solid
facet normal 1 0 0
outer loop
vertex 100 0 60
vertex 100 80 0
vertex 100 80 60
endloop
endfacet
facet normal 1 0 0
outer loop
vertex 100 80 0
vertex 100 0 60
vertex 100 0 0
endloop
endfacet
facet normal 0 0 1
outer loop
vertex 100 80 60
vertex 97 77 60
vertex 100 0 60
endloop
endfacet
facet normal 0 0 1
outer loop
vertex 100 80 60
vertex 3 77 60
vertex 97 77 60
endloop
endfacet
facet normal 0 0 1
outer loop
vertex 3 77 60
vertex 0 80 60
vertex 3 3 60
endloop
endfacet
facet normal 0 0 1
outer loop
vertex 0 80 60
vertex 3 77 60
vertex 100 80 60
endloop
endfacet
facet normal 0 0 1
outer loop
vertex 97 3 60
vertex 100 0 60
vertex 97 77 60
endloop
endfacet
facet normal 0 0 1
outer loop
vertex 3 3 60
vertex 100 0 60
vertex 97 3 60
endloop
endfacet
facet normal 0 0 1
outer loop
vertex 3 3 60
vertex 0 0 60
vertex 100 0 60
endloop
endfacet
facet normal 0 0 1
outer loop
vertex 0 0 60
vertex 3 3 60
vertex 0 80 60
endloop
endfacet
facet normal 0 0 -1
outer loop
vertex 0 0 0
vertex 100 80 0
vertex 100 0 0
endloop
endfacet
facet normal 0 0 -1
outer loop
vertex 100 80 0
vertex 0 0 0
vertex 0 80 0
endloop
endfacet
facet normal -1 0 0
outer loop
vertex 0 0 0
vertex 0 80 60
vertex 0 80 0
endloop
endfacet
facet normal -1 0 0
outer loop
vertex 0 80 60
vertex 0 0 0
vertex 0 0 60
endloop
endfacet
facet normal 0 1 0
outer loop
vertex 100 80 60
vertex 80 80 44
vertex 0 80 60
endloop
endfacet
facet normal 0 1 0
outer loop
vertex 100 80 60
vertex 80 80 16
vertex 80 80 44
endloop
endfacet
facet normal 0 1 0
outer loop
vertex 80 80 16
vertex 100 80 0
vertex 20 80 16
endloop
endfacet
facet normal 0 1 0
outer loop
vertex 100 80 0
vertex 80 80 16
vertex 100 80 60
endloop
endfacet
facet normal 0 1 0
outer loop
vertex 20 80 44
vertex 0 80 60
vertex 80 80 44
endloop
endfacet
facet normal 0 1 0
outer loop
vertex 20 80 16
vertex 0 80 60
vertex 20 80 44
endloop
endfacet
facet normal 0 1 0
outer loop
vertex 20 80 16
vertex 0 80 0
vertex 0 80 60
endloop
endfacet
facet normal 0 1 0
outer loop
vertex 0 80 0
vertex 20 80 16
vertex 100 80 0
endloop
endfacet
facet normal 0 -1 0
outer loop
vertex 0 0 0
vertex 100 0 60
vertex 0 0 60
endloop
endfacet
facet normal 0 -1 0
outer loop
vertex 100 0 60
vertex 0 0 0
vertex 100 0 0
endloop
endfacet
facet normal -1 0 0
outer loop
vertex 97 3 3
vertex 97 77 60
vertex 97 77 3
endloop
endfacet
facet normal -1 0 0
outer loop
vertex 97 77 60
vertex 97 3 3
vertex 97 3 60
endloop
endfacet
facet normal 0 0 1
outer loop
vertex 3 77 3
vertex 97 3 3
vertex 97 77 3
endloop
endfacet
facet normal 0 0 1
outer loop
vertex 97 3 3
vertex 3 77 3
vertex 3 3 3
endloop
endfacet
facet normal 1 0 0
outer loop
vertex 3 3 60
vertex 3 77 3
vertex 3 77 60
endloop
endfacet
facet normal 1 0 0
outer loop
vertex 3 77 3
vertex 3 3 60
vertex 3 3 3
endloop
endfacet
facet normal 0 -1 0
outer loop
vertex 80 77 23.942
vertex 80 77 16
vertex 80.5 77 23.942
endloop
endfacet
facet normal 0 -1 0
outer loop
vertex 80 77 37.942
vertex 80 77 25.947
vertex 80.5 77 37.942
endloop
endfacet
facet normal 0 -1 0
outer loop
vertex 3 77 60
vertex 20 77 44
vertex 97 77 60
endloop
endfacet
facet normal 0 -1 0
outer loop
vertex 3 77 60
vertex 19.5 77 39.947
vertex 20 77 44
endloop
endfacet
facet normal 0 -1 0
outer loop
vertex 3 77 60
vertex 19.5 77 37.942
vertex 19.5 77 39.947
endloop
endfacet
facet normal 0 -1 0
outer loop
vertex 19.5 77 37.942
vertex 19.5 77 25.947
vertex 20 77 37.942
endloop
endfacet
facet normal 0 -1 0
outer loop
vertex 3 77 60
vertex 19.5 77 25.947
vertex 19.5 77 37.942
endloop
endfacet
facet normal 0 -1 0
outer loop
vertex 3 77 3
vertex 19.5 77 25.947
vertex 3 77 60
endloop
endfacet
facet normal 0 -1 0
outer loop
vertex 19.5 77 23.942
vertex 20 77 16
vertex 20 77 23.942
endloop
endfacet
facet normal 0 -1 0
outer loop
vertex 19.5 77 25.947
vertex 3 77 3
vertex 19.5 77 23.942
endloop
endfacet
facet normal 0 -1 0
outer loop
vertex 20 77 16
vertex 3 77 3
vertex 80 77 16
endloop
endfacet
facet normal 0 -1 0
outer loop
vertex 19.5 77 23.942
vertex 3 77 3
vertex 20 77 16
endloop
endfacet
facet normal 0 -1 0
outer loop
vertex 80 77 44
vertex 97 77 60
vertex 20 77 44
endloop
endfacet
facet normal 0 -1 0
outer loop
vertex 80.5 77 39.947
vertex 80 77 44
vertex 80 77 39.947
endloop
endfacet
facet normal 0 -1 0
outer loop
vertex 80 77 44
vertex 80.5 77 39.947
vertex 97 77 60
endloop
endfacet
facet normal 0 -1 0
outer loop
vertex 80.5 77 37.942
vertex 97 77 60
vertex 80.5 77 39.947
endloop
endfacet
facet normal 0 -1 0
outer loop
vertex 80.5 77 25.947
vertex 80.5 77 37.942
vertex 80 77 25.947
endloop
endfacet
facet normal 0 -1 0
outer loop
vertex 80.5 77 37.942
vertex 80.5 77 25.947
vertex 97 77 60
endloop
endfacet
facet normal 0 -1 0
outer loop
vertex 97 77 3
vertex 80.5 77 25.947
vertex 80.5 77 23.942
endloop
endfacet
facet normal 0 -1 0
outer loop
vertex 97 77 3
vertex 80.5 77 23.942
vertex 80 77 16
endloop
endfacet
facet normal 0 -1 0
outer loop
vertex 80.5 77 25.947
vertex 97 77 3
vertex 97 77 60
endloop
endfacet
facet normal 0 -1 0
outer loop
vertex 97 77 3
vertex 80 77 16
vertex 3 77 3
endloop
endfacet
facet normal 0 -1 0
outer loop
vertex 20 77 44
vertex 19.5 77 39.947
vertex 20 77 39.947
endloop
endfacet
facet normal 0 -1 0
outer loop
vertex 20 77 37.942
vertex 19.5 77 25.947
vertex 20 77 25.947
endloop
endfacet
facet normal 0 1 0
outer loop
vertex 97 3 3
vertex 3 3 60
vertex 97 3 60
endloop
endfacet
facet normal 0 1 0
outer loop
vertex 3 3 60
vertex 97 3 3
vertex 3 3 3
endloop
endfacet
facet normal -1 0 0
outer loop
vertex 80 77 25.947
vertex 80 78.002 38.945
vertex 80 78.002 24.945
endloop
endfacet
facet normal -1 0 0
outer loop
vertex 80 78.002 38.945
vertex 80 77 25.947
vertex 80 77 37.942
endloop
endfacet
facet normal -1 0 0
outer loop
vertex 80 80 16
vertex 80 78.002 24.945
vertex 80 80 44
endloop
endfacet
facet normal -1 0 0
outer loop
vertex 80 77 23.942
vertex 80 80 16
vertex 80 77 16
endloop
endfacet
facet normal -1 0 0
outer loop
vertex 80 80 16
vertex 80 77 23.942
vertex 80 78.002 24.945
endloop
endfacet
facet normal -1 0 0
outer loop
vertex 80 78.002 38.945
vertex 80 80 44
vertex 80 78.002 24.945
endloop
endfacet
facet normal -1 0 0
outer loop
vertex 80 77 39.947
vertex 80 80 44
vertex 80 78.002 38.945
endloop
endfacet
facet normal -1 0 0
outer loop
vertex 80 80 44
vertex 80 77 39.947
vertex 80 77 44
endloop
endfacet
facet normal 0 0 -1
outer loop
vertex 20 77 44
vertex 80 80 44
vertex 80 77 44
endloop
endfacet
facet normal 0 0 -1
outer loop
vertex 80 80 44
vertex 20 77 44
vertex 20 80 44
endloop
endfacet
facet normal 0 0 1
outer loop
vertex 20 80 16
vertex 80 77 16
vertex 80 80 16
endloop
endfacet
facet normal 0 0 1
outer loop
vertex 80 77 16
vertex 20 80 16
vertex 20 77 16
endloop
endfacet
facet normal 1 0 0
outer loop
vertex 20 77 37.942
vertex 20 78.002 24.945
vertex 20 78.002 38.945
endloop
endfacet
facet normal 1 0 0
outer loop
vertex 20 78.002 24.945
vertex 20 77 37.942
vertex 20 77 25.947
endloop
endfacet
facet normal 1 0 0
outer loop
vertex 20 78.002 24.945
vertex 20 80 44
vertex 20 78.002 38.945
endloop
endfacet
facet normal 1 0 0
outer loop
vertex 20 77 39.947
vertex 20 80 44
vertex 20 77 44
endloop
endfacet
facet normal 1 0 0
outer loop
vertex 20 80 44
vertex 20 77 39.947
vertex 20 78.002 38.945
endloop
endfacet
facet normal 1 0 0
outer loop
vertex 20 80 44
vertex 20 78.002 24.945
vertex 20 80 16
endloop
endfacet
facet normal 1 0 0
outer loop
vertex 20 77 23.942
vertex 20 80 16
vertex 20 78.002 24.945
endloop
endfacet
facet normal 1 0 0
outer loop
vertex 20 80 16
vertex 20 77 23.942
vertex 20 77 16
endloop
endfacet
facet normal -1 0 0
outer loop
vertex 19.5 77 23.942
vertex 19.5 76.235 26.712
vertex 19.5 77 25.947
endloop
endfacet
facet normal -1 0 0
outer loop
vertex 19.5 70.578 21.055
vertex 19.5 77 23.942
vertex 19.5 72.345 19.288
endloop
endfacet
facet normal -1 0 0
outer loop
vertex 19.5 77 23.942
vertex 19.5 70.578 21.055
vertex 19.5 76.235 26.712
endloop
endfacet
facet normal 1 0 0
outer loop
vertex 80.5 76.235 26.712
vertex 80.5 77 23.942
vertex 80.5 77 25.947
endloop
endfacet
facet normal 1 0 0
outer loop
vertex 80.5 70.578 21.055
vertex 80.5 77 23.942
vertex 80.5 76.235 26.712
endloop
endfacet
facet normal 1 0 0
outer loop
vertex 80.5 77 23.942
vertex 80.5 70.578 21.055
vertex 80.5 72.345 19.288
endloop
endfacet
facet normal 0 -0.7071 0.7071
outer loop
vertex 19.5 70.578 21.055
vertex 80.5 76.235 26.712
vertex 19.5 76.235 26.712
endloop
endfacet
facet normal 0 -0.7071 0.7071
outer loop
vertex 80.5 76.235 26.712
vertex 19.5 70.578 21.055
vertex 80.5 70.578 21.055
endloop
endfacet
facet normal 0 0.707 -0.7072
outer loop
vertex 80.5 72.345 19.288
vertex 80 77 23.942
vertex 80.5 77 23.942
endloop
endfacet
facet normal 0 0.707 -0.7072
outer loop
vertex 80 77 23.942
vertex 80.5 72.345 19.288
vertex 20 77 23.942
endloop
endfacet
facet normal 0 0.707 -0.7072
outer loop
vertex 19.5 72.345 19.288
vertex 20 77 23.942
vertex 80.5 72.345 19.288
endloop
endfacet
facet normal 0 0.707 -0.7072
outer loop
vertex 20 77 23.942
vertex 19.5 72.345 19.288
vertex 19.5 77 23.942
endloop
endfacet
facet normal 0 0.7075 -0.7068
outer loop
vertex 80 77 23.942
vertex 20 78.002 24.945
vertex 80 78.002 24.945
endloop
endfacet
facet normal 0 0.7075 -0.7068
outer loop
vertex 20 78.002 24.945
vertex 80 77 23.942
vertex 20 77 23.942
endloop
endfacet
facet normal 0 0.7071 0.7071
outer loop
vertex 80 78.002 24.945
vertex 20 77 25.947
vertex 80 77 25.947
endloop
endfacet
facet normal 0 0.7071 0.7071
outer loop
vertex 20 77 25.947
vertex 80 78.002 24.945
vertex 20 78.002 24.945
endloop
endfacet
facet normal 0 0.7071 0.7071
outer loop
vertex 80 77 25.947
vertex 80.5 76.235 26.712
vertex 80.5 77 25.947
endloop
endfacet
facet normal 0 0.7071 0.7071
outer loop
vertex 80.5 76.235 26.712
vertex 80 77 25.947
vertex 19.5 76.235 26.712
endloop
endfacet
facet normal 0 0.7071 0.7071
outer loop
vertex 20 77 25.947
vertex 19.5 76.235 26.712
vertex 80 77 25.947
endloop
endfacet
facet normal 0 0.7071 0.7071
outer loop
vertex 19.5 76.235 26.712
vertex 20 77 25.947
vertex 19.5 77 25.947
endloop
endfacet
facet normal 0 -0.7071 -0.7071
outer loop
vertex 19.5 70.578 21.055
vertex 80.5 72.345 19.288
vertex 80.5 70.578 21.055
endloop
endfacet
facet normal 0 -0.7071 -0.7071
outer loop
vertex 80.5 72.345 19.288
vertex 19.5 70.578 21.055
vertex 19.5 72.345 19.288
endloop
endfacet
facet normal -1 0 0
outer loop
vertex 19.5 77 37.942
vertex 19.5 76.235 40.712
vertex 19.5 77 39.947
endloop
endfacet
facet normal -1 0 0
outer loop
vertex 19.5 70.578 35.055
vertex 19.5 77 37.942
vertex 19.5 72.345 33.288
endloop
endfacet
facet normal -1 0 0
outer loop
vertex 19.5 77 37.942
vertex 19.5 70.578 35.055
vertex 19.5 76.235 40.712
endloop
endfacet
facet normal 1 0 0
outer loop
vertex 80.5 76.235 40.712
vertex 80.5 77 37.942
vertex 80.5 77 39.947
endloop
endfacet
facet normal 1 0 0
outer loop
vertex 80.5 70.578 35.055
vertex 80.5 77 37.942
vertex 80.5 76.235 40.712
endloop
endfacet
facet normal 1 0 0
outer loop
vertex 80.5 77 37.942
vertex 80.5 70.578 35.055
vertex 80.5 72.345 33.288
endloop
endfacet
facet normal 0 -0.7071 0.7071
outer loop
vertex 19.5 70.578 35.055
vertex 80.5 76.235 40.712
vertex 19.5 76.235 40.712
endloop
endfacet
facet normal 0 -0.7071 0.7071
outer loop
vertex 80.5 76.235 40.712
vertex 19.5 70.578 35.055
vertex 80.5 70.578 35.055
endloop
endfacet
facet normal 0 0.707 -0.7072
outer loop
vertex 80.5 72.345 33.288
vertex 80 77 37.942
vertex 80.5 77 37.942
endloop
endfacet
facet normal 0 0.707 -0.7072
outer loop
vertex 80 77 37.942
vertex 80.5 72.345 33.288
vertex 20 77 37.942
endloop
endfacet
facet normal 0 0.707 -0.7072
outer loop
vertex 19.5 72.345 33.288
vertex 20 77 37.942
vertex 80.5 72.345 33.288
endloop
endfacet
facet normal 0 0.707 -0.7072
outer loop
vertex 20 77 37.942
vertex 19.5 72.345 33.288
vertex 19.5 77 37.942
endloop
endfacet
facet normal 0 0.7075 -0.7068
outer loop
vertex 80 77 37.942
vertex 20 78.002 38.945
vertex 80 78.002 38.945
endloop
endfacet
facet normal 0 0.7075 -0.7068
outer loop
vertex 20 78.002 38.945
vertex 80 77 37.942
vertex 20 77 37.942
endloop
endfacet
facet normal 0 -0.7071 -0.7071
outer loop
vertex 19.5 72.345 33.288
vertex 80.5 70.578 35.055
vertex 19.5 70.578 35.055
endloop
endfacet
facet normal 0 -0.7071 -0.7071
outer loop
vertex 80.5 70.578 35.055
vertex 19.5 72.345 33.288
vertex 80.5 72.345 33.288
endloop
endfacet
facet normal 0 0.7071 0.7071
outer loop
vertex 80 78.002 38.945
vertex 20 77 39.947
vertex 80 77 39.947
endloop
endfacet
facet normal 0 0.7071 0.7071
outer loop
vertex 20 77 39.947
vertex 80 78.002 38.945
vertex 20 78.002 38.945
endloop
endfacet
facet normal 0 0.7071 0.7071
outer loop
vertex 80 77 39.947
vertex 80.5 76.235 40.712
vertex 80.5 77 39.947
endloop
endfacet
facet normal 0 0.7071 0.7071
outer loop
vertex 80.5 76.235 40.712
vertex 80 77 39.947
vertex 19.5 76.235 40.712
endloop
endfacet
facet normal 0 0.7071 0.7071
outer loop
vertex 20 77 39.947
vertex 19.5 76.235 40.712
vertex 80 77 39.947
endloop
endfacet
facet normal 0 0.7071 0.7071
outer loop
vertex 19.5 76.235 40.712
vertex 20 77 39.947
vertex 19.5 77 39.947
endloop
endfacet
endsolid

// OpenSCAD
$fn = 32;

// ----------------------------------------------------------------------
// Vent box: louvers enclosure
// ----------------------------------------------------------------------

// --- parameters (mm) ---
box_l = 100;              // box length, X
box_w = 80;               // box width, Y
box_h = 60;               // box height, Z
wall_t = 3;               // shell wall thickness
win_l = 60;               // vent window width, X
win_h = 28;               // vent window height, Z
slat_t = 2.5;             // louver slat thickness
slat_d = 8;               // louver slat depth
slat_a = 45;              // louver slat angle, degrees
slat_pitch = 14;          // louver pitch
slat_yc = 74.29;          // slat centreline Y

win_z0 = (box_h - win_h) / 2;  // window lower edge Z
n_slats = 2;  // louver count
slat_z0 = win_z0 + (win_h - (n_slats - 1) * slat_pitch) / 2;

difference() {
  union() {
    difference() {
      cube([box_l, box_w, box_h]);
  translate([wall_t, wall_t, wall_t])
    cube([box_l - 2 * wall_t, box_w - 2 * wall_t, box_h]);
  translate([(box_l - win_l) / 2, box_w - wall_t - 1, win_z0])
    cube([win_l, wall_t + 2, win_h]);
    }
    for (i = [0 : n_slats - 1])
      translate([box_l / 2, slat_yc, slat_z0 + i * slat_pitch])
        rotate([slat_a, 0, 0])
          cube([win_l + 1, slat_d, slat_t], center = true);
  }
}
